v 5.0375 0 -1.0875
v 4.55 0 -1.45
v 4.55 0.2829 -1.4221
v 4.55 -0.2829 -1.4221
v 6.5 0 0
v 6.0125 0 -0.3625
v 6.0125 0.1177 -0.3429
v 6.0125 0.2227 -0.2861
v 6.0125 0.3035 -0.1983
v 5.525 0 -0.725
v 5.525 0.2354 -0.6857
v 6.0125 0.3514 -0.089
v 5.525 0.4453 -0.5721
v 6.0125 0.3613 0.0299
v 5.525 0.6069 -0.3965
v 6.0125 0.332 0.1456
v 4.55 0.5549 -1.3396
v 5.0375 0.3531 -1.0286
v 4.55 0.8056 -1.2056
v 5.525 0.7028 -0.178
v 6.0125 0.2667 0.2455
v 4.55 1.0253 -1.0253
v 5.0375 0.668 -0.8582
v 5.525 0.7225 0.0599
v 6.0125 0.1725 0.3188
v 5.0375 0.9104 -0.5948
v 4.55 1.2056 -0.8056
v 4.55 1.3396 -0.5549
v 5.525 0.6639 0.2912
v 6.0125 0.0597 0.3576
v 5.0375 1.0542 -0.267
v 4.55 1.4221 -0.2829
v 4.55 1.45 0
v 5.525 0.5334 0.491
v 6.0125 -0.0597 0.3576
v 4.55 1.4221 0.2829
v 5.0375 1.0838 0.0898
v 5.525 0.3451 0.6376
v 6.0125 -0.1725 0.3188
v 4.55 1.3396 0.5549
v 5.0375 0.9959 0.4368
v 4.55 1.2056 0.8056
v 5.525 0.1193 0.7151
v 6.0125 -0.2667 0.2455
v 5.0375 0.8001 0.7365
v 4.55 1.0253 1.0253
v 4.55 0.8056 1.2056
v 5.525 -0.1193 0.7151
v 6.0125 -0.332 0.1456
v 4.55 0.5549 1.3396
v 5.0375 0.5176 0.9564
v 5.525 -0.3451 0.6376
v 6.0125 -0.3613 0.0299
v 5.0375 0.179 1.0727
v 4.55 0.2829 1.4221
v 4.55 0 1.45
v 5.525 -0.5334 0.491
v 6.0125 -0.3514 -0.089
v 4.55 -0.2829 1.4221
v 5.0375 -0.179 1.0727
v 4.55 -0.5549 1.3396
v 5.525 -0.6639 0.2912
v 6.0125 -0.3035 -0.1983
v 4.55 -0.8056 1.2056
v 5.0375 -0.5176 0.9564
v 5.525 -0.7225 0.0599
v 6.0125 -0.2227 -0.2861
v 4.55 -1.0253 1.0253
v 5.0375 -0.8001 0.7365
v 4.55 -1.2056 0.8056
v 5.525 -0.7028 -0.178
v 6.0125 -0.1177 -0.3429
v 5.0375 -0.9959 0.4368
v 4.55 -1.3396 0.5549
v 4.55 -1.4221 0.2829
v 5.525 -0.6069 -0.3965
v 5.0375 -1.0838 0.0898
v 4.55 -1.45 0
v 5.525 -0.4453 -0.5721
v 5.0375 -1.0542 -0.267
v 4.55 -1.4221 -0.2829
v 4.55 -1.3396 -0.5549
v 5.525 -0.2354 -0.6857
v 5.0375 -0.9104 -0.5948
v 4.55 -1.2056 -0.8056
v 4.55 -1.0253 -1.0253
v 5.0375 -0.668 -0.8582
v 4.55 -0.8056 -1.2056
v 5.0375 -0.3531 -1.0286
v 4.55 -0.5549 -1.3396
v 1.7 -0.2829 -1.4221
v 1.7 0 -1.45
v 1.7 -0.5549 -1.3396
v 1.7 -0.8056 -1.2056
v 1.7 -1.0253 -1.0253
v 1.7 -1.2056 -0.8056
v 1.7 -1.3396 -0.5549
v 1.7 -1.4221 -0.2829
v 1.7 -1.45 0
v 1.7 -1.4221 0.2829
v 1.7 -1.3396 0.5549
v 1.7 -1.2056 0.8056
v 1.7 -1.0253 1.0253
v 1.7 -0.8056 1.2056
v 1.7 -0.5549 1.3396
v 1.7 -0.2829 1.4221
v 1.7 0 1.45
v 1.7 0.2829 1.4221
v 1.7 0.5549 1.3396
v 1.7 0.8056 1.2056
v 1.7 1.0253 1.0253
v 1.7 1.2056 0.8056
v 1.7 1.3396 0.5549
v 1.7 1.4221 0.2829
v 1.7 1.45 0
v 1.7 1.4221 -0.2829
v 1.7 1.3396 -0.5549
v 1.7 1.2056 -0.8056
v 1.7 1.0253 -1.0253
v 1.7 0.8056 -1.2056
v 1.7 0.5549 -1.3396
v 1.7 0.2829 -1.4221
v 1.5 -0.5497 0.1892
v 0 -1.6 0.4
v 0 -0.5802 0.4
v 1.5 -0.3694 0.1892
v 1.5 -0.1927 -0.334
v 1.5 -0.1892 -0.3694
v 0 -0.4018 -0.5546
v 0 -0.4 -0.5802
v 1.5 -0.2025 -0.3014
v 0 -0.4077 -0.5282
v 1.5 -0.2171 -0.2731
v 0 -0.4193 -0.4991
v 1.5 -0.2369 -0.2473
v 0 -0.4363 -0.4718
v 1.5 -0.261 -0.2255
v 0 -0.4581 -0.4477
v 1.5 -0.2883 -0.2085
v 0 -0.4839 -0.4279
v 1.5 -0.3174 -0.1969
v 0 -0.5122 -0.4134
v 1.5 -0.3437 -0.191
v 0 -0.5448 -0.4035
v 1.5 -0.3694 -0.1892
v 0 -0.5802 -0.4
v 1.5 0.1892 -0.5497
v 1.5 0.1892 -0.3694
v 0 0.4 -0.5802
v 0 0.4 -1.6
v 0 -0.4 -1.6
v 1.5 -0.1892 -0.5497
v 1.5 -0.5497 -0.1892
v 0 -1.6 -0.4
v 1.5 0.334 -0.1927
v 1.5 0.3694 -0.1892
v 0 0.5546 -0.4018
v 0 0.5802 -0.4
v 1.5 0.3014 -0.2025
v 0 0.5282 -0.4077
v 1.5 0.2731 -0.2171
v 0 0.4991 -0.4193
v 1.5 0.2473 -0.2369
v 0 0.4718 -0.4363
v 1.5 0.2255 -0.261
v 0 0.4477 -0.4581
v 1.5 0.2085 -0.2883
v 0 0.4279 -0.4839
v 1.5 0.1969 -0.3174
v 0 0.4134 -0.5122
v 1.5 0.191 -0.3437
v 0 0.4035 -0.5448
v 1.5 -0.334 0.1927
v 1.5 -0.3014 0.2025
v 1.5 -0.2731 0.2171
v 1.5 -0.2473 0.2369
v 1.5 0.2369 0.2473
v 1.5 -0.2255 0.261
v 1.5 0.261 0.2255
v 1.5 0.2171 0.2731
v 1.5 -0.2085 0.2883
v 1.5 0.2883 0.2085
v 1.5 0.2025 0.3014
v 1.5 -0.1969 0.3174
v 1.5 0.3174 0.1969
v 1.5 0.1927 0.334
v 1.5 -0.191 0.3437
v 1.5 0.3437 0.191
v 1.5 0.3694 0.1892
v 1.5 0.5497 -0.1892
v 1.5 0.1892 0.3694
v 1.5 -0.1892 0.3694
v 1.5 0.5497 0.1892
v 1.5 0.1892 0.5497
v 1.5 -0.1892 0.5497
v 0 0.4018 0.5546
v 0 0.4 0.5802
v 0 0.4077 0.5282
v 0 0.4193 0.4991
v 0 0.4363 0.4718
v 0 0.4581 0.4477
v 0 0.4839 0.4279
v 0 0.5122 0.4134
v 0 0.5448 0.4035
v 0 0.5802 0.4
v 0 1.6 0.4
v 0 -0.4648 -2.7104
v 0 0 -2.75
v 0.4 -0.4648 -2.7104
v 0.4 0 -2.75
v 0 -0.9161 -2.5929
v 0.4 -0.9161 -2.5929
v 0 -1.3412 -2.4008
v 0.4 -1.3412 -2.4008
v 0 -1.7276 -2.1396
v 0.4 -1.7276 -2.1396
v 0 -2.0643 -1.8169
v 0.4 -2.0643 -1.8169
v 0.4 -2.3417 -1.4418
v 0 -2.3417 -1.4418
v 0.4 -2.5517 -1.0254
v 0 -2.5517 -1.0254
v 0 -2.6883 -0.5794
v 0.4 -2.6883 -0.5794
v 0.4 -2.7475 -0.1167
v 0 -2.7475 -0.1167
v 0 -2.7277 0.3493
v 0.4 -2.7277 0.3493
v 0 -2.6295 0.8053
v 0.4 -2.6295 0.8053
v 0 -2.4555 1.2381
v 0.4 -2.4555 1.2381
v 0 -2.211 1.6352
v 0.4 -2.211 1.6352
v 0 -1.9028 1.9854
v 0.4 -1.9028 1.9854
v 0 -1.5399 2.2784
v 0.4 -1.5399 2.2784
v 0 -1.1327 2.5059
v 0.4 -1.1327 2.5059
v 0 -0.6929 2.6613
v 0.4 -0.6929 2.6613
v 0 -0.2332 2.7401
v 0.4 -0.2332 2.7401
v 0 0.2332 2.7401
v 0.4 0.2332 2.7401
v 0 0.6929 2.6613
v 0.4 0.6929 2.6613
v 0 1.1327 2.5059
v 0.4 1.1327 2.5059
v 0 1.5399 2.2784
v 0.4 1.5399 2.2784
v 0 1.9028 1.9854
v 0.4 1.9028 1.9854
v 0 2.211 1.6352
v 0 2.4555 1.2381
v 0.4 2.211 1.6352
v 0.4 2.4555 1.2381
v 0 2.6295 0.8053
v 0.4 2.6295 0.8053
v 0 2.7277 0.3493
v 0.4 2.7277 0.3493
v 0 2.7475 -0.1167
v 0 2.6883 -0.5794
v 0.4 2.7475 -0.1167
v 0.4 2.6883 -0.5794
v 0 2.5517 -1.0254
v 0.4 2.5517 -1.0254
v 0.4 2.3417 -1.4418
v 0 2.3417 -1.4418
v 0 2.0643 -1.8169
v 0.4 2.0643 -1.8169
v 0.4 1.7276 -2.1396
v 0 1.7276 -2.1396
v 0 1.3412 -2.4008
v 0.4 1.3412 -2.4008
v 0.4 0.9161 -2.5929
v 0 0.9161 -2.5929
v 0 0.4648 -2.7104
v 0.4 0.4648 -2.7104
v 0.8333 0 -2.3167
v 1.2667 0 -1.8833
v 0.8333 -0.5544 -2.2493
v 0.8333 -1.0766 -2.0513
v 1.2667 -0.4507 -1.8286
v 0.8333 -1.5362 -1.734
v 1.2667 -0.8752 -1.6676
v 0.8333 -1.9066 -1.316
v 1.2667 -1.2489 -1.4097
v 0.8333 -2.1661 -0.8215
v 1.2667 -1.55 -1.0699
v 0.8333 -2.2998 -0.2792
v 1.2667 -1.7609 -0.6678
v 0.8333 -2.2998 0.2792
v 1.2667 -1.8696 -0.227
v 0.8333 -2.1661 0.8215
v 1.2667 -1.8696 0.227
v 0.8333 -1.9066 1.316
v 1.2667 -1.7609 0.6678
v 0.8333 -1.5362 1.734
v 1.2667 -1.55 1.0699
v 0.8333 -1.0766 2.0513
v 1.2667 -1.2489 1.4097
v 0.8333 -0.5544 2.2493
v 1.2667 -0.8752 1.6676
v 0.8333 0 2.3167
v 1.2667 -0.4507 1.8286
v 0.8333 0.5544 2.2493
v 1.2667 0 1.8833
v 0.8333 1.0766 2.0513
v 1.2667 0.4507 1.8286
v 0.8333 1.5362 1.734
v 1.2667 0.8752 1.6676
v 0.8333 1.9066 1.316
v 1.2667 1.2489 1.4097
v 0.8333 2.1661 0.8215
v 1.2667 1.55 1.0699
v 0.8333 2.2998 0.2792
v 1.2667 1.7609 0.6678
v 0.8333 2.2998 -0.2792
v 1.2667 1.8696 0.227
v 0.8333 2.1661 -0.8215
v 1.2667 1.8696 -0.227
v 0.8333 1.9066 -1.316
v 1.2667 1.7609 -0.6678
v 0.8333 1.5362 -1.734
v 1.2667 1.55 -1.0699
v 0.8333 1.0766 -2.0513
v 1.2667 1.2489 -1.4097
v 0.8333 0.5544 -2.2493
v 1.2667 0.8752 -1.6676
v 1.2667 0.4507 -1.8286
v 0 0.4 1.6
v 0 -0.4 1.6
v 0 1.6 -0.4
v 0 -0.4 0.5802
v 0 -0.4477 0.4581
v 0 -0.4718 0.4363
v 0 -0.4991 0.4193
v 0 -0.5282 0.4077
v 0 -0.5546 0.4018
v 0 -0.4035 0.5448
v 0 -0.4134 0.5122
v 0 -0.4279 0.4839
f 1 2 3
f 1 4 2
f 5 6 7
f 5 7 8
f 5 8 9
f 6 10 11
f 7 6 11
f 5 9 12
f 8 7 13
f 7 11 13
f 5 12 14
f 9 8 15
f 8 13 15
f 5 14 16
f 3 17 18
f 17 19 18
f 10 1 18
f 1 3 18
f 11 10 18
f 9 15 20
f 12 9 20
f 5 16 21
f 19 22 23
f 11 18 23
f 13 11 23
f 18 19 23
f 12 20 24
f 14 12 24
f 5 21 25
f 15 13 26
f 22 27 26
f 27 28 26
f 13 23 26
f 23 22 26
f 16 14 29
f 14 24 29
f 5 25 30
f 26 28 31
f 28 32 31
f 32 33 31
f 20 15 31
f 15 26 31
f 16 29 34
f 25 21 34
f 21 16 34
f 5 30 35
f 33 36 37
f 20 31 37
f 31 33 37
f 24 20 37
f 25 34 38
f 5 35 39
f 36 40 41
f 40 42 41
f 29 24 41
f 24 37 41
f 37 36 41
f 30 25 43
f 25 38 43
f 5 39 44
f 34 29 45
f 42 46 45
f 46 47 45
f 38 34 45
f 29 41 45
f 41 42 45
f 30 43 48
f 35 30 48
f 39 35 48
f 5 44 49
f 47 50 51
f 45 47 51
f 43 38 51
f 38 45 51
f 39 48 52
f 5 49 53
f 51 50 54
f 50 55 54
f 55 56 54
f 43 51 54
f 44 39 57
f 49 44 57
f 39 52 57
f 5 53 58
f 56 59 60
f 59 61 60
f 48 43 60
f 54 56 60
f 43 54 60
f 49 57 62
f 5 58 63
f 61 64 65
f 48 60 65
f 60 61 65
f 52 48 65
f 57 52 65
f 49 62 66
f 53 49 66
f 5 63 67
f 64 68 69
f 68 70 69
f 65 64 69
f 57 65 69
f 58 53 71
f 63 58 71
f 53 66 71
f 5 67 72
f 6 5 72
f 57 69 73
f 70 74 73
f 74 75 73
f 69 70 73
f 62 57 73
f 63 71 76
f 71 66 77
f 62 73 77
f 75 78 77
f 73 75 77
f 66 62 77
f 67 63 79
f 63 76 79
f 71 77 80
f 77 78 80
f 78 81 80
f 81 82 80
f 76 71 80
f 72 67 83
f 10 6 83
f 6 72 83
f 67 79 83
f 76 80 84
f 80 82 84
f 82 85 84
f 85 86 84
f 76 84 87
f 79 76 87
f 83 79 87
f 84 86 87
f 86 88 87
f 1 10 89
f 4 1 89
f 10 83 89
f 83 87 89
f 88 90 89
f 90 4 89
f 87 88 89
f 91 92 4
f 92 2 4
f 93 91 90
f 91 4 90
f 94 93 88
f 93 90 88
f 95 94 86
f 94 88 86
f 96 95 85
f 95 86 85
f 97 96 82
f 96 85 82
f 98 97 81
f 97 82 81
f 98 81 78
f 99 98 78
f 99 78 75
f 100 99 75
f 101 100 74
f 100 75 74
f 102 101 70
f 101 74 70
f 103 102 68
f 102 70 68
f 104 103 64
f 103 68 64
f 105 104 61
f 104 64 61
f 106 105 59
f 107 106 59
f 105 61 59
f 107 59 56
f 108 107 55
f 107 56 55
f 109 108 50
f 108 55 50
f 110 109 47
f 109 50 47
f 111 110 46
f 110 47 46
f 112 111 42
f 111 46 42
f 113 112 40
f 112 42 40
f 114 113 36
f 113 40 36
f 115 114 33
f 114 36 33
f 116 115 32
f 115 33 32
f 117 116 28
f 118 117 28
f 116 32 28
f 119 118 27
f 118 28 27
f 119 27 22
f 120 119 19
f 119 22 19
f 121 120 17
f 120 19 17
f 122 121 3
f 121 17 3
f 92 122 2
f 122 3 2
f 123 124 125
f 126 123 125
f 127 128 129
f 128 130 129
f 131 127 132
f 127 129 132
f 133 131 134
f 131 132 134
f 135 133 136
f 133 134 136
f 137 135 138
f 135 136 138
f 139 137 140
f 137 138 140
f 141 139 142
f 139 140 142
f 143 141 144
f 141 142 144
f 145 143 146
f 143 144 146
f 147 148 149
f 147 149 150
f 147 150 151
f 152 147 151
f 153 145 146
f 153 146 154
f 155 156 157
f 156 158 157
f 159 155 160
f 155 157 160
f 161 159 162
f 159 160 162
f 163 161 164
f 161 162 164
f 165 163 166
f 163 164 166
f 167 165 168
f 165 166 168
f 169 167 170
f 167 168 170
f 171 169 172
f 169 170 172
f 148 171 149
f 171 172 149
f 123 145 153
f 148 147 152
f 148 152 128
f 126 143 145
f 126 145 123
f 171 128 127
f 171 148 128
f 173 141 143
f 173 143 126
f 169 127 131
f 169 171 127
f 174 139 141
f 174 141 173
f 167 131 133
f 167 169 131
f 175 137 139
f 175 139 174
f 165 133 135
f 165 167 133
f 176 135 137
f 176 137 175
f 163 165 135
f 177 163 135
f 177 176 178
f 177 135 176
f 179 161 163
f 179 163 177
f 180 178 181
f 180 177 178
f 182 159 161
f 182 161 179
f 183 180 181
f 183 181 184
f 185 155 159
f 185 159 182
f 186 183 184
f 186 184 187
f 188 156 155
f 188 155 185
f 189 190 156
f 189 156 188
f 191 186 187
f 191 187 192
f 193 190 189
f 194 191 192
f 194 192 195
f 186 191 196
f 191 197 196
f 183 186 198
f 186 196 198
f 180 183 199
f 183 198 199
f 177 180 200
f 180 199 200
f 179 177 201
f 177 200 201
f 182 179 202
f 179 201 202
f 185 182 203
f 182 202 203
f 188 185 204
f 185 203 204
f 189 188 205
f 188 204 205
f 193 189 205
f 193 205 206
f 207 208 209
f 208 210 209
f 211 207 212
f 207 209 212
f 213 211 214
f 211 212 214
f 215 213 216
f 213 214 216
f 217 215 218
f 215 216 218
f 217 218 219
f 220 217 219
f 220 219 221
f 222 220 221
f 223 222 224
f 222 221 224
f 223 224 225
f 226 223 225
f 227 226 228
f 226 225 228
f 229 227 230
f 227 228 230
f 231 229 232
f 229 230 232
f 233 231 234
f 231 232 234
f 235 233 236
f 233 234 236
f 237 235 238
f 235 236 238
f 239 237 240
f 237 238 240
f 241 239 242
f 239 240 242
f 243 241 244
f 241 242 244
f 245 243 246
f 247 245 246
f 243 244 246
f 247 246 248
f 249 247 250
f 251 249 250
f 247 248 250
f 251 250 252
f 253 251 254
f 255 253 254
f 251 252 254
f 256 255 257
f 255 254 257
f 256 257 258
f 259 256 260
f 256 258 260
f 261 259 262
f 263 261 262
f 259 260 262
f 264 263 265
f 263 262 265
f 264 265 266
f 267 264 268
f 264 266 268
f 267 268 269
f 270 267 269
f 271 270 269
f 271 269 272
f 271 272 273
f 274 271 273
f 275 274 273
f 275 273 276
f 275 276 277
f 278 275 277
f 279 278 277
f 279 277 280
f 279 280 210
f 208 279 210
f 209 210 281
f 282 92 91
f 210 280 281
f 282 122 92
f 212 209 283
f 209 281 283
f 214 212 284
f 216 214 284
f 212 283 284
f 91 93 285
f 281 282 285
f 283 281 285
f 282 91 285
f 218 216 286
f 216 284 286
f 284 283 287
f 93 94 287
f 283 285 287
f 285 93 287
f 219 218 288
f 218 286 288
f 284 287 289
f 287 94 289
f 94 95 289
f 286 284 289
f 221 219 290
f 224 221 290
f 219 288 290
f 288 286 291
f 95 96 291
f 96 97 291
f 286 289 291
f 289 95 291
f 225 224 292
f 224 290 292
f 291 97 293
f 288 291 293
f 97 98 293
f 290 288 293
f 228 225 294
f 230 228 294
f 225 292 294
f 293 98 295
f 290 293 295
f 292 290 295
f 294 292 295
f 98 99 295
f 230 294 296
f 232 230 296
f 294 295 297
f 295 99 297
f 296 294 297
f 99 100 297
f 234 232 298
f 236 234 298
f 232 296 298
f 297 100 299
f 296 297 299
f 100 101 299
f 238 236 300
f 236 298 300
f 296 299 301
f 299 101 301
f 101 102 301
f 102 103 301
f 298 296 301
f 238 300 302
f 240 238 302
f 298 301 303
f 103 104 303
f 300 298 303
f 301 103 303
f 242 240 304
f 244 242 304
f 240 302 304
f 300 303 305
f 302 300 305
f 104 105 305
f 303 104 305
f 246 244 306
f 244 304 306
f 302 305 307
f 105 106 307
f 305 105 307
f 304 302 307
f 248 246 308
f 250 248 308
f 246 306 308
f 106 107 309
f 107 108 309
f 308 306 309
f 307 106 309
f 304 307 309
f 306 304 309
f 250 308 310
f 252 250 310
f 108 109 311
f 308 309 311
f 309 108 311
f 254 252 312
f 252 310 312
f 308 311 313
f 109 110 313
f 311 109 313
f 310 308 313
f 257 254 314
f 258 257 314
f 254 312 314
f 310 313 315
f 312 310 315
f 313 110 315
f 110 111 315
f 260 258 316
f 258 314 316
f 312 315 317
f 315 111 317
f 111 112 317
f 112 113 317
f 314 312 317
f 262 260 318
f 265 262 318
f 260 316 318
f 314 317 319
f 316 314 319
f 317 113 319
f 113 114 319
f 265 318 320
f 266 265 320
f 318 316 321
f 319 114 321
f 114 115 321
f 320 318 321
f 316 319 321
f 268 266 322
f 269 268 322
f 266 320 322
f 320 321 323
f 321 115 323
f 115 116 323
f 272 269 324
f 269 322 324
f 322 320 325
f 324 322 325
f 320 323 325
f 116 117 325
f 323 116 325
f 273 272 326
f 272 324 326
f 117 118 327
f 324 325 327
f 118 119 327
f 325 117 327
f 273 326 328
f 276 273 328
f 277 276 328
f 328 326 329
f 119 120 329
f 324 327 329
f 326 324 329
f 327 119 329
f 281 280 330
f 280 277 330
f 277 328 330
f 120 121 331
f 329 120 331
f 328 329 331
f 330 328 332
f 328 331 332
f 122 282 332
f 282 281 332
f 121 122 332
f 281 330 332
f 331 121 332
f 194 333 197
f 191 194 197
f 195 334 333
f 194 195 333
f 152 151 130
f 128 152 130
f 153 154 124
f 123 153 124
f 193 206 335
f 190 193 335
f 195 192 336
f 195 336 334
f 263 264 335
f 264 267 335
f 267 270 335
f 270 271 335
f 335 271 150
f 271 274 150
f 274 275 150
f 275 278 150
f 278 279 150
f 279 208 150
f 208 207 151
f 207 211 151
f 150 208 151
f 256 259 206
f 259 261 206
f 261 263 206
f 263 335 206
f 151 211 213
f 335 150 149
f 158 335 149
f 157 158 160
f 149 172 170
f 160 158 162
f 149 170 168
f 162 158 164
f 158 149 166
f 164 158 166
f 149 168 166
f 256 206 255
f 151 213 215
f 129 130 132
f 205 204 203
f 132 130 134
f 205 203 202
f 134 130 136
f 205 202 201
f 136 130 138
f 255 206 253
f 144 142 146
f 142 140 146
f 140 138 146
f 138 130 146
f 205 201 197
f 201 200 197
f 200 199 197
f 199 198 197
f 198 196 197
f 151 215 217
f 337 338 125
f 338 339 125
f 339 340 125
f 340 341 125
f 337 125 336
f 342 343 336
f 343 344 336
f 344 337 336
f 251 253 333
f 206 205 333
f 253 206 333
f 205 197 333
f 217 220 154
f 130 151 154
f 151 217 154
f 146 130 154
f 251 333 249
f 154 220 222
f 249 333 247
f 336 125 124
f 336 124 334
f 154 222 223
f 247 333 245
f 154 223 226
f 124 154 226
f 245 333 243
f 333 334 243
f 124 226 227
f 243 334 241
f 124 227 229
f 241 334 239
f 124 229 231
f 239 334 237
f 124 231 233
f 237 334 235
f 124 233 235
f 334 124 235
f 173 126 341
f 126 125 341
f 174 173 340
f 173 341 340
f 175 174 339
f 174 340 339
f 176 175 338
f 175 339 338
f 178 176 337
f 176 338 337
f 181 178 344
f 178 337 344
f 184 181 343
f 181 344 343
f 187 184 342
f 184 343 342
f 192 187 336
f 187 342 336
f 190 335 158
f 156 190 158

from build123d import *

# Parameters (mm, degrees)
CHAMFER1_SIZE      = 0.29
CHAMFER1_SIZE2     = 0.502294734
CUT_EXTRUDE1_DEPTH = 1.5
DRAFT1_ANGLE       = 35
DRAFT2_ANGLE       = 8


with BuildPart() as part:
    # Sketch1 → Revolve1 (revolve)
    with BuildSketch(Plane.XY, mode=Mode.PRIVATE) as revolve1_sk:
        Polygon((0, 2.75), (0.4, 2.75), (1.7, 1.45), (6.5, 1.45), (6.5, 0), (0, 0), align=None)
    revolve(revolve1_sk.sketch.rotate(Axis((6.620684694, 0, 0), (-1, 0, 0)), 90), axis=Axis((6.620684694, 0, 0), (-1, 0, 0)))

    # Chamfer1
    chamfer1_edges = [part.edges().sort_by_distance(p)[0] for p in [
        (6.5, 0, 1.45),
    ]]
    chamfer1_side = [part.faces().sort_by_distance(p)[0] for p in [
        (6.5, 0, 0),
    ]]
    chamfer(chamfer1_edges, length=CHAMFER1_SIZE, length2=CHAMFER1_SIZE2, reference=chamfer1_side[0])

    # Sketch3 → EndCone (revolve, cut)
    with BuildSketch(Plane.XY, mode=Mode.PRIVATE) as endcone_sk:
        Polygon((4.55, 1.45), (6.5, 1.45), (6.7, 1.45), (6.7, 0), (6.5, 0), align=None)
    revolve(endcone_sk.sketch.rotate(Axis((2.9, 0, 0), (1, 0, 0)), 270), axis=Axis((2.9, 0, 0), (1, 0, 0)), mode=Mode.SUBTRACT)

    # Sketch4 → Cut-Extrude1 (cut)
    with BuildSketch(Plane.ZY):
        Polygon((-0.4, 1.6), (-0.4, 0.4), (-1.6, 0.4), (-1.6, -0.4), (-0.4, -0.4), (-0.4, -1.6), (0.4, -1.6), (0.4, -0.4), (1.6, -0.4), (1.6, 0.4), (0.4, 0.4), (0.4, 1.6), align=None)
    extrude(amount=-CUT_EXTRUDE1_DEPTH, mode=Mode.SUBTRACT)

    # Draft1
    draft1_faces = [part.faces().sort_by_distance(p)[0] for p in [
        (0.75, 0, 1.6),
        (0.75, 1.6, 0),
        (0.75, 0, -1.6),
        (0.75, -1.6, 0),
    ]]
    draft(draft1_faces, Plane(origin=(0, 0, 0), x_dir=(0, 0, -1), z_dir=(-1, 0, 0)), DRAFT1_ANGLE)

    # Draft2
    draft2_faces = [part.faces().sort_by_distance(p)[0] for p in [
        (0.555453044, -0.805533796, -0.4),
        (0.555453044, -0.4, -0.805533796),
        (0.555453044, -0.4, 0.805533796),
        (0.555453044, -0.805533796, 0.4),
        (0.555453044, 0.805533796, 0.4),
        (0.555453044, 0.4, 0.805533796),
        (0.555453044, 0.4, -0.805533796),
        (0.555453044, 0.805533796, -0.4),
    ]]
    draft(draft2_faces, Plane(origin=(0, 0, 0), x_dir=(0, 0, -1), z_dir=(-1, 0, 0)), DRAFT2_ANGLE)

    # Sketch6 for Cut-Loft1 → Cut-Loft1 section 0
    with BuildSketch(Plane.ZY.offset(-1.5)):
        with BuildLine():
            Line((-0.36943872, 0.189188748), (-0.36943872, -0.189188748))
            # circular arc as an exact rational Bezier (weights 1, cos(half-angle), 1)
            Bezier((-0.36943872, -0.189188748), (-0.189188748, -0.189188748), (-0.189188748, -0.36943872), weights=[1, 0.707106781, 1])
            Line((-0.189188748, -0.36943872), (0.189188748, -0.36943872))
            Bezier((0.189188748, -0.36943872), (0.189188748, -0.189188748), (0.36943872, -0.189188748), weights=[1, 0.707106781, 1])
            Line((0.36943872, -0.189188748), (0.36943872, 0.189188748))
            Bezier((0.36943872, 0.189188748), (0.189188748, 0.189188748), (0.189188748, 0.36943872), weights=[1, 0.707106781, 1])
            Line((0.189188748, 0.36943872), (-0.189188748, 0.36943872))
            Bezier((-0.189188748, 0.36943872), (-0.189188748, 0.189188748), (-0.36943872, 0.189188748), weights=[1, 0.707106781, 1])
        make_face()
    # Sketch7 for Cut-Loft1 → Cut-Loft1 section 1
    with BuildSketch(Plane.ZY):
        with BuildLine():
            Line((0.580249972, 0.4), (0.580249972, -0.4))
            Bezier((0.580249972, -0.4), (0.4, -0.4), (0.4, -0.580249972), weights=[1, 0.707106781, 1])
            Line((0.4, -0.580249972), (-0.4, -0.580249972))
            Bezier((-0.4, -0.580249972), (-0.4, -0.4), (-0.580249972, -0.4), weights=[1, 0.707106781, 1])
            Line((-0.580249972, -0.4), (-0.580249972, 0.4))
            Bezier((-0.580249972, 0.4), (-0.4, 0.4), (-0.4, 0.580249972), weights=[1, 0.707106781, 1])
            Line((-0.4, 0.580249972), (0.4, 0.580249972))
            Bezier((0.4, 0.580249972), (0.4, 0.4), (0.580249972, 0.4), weights=[1, 0.707106781, 1])
        make_face()
    loft(mode=Mode.SUBTRACT)


solid = part.part
